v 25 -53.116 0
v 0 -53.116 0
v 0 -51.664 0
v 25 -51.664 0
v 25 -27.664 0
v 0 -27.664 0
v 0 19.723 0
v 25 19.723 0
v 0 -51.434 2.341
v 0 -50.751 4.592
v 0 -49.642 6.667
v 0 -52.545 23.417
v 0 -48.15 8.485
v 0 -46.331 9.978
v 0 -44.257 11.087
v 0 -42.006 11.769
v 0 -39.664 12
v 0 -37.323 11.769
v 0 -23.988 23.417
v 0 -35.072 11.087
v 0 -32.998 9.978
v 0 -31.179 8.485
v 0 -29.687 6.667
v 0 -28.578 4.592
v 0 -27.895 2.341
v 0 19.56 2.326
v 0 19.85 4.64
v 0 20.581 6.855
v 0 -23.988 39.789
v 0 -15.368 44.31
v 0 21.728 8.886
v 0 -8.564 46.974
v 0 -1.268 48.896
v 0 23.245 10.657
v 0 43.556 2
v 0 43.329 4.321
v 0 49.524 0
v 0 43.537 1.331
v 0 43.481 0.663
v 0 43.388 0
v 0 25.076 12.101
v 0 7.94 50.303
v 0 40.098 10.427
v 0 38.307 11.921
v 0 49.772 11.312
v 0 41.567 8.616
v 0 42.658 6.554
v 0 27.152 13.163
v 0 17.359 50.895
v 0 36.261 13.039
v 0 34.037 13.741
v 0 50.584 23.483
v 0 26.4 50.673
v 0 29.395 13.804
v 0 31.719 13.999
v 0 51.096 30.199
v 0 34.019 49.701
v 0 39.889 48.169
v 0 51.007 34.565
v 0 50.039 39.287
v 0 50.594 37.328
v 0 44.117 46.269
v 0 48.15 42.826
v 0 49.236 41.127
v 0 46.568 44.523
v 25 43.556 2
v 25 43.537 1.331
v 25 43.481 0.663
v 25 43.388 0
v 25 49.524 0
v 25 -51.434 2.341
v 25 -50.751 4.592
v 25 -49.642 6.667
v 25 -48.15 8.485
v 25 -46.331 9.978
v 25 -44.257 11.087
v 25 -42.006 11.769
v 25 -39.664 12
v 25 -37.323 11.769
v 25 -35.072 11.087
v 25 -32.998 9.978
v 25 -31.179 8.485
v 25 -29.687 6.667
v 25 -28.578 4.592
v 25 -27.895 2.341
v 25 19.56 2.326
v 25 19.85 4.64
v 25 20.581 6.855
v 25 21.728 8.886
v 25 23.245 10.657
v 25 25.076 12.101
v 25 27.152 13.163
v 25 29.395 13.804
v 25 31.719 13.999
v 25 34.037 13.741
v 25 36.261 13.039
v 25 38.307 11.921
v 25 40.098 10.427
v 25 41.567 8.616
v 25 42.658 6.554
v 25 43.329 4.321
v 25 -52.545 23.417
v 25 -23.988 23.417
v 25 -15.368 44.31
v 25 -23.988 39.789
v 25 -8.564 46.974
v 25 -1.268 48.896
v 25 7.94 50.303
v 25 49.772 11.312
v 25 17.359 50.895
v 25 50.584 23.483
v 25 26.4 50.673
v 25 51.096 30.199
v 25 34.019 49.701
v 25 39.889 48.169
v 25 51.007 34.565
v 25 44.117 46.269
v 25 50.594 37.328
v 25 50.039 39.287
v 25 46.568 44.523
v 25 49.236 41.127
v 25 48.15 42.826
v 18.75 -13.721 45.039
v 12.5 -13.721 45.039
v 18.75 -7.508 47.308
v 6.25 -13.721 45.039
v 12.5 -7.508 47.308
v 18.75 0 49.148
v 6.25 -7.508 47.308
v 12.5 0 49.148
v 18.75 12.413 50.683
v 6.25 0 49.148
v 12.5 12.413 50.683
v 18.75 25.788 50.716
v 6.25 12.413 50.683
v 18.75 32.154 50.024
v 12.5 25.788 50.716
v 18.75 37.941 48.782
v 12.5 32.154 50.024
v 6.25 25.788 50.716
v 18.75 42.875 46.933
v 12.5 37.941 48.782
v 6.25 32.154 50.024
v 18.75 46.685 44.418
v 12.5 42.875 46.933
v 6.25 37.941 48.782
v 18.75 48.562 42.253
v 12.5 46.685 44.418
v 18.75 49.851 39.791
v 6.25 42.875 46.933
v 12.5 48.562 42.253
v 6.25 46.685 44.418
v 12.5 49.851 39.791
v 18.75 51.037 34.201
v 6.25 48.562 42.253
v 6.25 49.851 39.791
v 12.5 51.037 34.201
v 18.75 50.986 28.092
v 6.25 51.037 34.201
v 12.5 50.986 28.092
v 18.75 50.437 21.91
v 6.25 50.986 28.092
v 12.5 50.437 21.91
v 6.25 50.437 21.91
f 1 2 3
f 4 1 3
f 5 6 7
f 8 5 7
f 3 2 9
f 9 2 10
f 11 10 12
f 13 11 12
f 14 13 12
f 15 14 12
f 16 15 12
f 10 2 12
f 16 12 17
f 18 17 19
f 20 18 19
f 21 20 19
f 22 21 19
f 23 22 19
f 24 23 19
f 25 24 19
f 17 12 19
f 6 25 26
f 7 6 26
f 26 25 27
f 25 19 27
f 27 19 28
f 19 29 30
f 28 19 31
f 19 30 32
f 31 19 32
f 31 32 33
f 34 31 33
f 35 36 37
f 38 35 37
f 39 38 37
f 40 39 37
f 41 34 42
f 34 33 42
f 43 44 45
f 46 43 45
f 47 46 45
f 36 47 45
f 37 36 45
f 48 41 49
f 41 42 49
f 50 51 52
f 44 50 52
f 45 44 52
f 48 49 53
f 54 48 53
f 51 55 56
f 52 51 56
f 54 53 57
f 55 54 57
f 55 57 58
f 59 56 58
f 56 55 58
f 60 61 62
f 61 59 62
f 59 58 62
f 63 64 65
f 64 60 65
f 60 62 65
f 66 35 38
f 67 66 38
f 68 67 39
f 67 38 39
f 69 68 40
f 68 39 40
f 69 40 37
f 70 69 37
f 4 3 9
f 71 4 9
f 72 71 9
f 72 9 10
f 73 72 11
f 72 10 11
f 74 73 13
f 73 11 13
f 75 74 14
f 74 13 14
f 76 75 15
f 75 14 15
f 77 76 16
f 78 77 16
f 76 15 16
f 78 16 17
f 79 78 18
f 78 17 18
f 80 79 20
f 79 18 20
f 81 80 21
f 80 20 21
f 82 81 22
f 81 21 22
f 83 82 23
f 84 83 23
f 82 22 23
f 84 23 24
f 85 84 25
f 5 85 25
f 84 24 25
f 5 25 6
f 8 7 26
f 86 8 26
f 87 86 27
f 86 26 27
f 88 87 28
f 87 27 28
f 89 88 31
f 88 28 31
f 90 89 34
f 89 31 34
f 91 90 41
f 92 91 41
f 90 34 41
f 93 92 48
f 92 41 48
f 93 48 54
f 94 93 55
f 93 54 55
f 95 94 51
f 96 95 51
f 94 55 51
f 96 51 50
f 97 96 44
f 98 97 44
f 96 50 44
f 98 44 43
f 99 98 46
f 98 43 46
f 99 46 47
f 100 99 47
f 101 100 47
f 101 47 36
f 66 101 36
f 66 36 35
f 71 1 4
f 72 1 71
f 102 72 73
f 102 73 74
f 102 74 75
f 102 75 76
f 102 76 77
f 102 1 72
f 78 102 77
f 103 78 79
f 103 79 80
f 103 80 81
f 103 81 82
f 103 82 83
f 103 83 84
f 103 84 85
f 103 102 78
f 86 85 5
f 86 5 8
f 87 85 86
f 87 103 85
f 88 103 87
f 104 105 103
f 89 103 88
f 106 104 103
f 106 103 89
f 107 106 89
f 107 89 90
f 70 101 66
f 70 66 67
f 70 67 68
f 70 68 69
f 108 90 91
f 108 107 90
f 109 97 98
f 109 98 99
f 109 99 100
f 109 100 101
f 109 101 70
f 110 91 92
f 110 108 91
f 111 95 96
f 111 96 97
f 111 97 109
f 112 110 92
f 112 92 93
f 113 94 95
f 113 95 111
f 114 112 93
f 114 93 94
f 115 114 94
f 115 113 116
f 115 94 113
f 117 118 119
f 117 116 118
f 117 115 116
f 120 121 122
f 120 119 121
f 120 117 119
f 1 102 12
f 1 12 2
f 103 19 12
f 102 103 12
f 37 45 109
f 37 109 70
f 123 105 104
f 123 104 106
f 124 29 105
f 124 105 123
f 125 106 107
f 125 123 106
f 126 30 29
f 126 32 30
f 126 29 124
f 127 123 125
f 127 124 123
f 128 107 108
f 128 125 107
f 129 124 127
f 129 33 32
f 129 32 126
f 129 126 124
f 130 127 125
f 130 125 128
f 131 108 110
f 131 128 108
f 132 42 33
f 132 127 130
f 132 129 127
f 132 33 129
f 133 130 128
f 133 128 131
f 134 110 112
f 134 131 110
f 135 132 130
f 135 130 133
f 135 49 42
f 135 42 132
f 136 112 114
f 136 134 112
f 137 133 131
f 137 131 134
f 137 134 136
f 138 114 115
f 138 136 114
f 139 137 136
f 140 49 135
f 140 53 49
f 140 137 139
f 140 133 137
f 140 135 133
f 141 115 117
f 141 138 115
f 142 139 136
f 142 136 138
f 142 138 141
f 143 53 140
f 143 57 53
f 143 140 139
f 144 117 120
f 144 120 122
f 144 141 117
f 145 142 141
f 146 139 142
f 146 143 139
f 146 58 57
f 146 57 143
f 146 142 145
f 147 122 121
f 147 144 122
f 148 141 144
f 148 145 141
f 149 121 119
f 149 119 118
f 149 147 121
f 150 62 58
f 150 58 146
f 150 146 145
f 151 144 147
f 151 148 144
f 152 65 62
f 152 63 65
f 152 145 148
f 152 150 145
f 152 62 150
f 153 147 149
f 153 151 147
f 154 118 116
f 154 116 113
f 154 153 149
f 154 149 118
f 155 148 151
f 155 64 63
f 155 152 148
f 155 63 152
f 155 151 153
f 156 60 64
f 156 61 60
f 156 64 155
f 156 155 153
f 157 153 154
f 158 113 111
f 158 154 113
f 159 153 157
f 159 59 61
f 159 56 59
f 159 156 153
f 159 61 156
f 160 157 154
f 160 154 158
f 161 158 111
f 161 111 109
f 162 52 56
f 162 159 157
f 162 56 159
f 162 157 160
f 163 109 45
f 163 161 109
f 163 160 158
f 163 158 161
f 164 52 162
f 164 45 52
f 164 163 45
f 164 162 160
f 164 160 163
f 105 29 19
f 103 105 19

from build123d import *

# Parameters (mm, degrees)
F1_DEPTH = 25


with BuildPart() as f1:
    # F0 (on Right) → F1 (new body)
    with BuildSketch(Plane.YZ):
        with BuildLine():
            Line((-52.5449592137, 23.4167748248), (-53.1160976106, 0))
            Line((-53.1160976106, 0), (-51.6644665909, 0))
            ThreePointArc((-51.6644665909, 0), (-39.6644665909, 12), (-27.6644665909, 0))
            Line((-27.6644665909, 0), (19.7233738429, 0))
            ThreePointArc((19.7233738429, 0), (30.5520182858, 13.9579662735), (43.5555334091, 2))
            ThreePointArc((43.5555334091, 2), (43.5134996826, 0.9964848766), (43.3876929753, 0))
            Line((43.3876929753, 0), (49.5239698459, 0))
            add(Edge.make_bspline(
                [(-23.9879150499, 39.7894801698), (-17.5269069022, 43.4159746638), (-2.3438373307, 51.938068576), (54.5380665016, 52.1120860159), (49.8148991009, 21.1013181636), (49.6203009611, 6.9869683972), (49.5239698459, 0)],
                knots=[0, 0, 0, 0, 0.2372939293, 0.5576297313, 0.781015269, 1, 1, 1, 1], degree=3))
            Line((-23.9879150499, 39.7894801698), (-23.9879150499, 23.4167748248))
            Line((-23.9879150499, 23.4167748248), (-52.5449592137, 23.4167748248))
        make_face()
    extrude(amount=F1_DEPTH)


solid = f1.part
